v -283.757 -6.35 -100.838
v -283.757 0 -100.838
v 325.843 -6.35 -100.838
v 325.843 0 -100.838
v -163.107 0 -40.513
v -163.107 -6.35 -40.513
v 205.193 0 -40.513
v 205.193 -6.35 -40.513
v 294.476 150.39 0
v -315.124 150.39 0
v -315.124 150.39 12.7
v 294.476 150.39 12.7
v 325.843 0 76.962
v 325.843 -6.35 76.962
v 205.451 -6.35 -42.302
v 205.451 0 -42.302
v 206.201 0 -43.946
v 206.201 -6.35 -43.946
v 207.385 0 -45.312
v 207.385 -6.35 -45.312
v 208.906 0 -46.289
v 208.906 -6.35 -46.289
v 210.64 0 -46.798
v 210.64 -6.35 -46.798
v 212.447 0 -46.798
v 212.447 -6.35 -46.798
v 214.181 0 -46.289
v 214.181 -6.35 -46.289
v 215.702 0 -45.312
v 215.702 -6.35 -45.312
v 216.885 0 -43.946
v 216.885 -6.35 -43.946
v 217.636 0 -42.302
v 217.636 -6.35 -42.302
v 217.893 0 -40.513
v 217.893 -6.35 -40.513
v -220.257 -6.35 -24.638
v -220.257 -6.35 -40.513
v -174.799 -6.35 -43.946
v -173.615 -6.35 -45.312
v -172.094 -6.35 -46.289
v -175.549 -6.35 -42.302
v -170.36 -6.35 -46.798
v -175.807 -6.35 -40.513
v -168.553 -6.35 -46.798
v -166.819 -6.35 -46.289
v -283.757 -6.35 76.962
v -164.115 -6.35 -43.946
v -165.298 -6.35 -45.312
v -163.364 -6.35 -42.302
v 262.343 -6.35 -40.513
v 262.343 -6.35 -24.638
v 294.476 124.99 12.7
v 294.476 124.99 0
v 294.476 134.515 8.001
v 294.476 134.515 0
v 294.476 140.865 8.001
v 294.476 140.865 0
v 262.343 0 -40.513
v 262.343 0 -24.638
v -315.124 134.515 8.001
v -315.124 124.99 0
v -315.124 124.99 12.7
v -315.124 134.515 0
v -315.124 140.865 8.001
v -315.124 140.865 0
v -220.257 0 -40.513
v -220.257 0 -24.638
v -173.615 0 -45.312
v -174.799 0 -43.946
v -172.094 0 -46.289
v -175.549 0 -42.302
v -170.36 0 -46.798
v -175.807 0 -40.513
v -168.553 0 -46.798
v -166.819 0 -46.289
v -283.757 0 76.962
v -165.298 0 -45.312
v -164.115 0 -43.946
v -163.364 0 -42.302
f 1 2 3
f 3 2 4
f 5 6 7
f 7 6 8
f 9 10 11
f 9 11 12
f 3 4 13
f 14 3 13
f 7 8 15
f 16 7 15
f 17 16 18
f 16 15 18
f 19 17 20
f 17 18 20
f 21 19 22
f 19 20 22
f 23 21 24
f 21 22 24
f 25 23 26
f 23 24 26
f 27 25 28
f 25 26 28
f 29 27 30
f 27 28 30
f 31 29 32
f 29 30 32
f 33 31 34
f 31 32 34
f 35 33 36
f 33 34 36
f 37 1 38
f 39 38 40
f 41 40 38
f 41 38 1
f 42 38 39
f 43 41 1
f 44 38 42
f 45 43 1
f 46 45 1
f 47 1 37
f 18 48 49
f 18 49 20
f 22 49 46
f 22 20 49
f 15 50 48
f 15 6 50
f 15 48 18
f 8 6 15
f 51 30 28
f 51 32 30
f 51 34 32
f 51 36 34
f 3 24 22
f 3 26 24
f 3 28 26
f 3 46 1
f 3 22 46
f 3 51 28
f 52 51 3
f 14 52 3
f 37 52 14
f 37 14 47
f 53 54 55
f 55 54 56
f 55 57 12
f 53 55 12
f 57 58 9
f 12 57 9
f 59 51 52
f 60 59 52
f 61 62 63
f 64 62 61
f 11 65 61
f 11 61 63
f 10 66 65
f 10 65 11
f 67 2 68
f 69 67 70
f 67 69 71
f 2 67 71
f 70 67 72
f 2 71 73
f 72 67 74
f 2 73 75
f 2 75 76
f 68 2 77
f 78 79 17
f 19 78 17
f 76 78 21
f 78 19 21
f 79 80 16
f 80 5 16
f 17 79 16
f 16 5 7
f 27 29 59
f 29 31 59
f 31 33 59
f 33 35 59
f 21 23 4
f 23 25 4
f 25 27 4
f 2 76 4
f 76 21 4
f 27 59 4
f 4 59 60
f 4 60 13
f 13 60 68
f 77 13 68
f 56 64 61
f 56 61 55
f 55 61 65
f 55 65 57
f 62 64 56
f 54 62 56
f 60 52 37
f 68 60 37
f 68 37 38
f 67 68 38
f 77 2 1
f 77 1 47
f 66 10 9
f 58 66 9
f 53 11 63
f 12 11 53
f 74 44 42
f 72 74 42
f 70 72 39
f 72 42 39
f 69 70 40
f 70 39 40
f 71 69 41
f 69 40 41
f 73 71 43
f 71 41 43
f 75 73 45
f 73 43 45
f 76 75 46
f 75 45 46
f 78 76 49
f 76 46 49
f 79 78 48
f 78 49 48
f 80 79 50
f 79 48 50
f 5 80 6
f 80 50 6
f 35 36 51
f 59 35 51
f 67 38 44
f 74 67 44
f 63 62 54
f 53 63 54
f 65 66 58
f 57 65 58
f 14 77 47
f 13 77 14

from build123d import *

# Parameters (mm, degrees)
F0_W     = 609.6
F0_H     = 177.8
F1_DEPTH = 6.35
F3_DEPTH = 6.35
F4_W     = 609.6
F4_H     = 25.4
F5_DEPTH = 12.7
F6_W     = 609.6
F6_H     = 6.35
F7_DEPTH = 8.001


with BuildPart() as f1:
    # F0 (on Front) → F1 (new body)
    with BuildSketch(Plane.XZ):
        with Locations((21.043397, -11.938087)):
            Rectangle(F0_W, F0_H)
    extrude(amount=F1_DEPTH)

    # F2 (on face) → F3 (cut)
    with BuildSketch(Plane.XZ.offset(6.35)):
        with BuildLine():
            Line((262.343397, -24.638087), (-220.256603, -24.638087))
            Line((-220.256603, -24.638087), (-220.256603, -40.513087))
            Line((-220.256603, -40.513087), (-175.806603, -40.513087))
            ThreePointArc((-175.806603, -40.513087), (-169.456603, -46.863087), (-163.106603, -40.513087))
            Line((-163.106603, -40.513087), (205.193397, -40.513087))
            ThreePointArc((205.193397, -40.513087), (211.543397, -46.863087), (217.893397, -40.513087))
            Line((217.893397, -40.513087), (262.343397, -40.513087))
            Line((262.343397, -40.513087), (262.343397, -24.638087))
        make_face()
    extrude(amount=-F3_DEPTH, mode=Mode.SUBTRACT)


with BuildPart() as f5:
    # F4 (on Top) → F5 (new body)
    with BuildSketch(Plane.XY):
        with Locations((-10.323942, 137.690149)):
            Rectangle(F4_W, F4_H)
    extrude(amount=F5_DEPTH)

    # F6 (on face) → F7 (cut)
    with BuildSketch(Plane(origin=(0, 0, 0), x_dir=(1, 0, 0), z_dir=(0, 0, -1))):
        with Locations((-10.323942, -137.690149)):
            Rectangle(F6_W, F6_H)
    extrude(amount=-F7_DEPTH, mode=Mode.SUBTRACT)


solid = Compound([f1.part, f5.part])
